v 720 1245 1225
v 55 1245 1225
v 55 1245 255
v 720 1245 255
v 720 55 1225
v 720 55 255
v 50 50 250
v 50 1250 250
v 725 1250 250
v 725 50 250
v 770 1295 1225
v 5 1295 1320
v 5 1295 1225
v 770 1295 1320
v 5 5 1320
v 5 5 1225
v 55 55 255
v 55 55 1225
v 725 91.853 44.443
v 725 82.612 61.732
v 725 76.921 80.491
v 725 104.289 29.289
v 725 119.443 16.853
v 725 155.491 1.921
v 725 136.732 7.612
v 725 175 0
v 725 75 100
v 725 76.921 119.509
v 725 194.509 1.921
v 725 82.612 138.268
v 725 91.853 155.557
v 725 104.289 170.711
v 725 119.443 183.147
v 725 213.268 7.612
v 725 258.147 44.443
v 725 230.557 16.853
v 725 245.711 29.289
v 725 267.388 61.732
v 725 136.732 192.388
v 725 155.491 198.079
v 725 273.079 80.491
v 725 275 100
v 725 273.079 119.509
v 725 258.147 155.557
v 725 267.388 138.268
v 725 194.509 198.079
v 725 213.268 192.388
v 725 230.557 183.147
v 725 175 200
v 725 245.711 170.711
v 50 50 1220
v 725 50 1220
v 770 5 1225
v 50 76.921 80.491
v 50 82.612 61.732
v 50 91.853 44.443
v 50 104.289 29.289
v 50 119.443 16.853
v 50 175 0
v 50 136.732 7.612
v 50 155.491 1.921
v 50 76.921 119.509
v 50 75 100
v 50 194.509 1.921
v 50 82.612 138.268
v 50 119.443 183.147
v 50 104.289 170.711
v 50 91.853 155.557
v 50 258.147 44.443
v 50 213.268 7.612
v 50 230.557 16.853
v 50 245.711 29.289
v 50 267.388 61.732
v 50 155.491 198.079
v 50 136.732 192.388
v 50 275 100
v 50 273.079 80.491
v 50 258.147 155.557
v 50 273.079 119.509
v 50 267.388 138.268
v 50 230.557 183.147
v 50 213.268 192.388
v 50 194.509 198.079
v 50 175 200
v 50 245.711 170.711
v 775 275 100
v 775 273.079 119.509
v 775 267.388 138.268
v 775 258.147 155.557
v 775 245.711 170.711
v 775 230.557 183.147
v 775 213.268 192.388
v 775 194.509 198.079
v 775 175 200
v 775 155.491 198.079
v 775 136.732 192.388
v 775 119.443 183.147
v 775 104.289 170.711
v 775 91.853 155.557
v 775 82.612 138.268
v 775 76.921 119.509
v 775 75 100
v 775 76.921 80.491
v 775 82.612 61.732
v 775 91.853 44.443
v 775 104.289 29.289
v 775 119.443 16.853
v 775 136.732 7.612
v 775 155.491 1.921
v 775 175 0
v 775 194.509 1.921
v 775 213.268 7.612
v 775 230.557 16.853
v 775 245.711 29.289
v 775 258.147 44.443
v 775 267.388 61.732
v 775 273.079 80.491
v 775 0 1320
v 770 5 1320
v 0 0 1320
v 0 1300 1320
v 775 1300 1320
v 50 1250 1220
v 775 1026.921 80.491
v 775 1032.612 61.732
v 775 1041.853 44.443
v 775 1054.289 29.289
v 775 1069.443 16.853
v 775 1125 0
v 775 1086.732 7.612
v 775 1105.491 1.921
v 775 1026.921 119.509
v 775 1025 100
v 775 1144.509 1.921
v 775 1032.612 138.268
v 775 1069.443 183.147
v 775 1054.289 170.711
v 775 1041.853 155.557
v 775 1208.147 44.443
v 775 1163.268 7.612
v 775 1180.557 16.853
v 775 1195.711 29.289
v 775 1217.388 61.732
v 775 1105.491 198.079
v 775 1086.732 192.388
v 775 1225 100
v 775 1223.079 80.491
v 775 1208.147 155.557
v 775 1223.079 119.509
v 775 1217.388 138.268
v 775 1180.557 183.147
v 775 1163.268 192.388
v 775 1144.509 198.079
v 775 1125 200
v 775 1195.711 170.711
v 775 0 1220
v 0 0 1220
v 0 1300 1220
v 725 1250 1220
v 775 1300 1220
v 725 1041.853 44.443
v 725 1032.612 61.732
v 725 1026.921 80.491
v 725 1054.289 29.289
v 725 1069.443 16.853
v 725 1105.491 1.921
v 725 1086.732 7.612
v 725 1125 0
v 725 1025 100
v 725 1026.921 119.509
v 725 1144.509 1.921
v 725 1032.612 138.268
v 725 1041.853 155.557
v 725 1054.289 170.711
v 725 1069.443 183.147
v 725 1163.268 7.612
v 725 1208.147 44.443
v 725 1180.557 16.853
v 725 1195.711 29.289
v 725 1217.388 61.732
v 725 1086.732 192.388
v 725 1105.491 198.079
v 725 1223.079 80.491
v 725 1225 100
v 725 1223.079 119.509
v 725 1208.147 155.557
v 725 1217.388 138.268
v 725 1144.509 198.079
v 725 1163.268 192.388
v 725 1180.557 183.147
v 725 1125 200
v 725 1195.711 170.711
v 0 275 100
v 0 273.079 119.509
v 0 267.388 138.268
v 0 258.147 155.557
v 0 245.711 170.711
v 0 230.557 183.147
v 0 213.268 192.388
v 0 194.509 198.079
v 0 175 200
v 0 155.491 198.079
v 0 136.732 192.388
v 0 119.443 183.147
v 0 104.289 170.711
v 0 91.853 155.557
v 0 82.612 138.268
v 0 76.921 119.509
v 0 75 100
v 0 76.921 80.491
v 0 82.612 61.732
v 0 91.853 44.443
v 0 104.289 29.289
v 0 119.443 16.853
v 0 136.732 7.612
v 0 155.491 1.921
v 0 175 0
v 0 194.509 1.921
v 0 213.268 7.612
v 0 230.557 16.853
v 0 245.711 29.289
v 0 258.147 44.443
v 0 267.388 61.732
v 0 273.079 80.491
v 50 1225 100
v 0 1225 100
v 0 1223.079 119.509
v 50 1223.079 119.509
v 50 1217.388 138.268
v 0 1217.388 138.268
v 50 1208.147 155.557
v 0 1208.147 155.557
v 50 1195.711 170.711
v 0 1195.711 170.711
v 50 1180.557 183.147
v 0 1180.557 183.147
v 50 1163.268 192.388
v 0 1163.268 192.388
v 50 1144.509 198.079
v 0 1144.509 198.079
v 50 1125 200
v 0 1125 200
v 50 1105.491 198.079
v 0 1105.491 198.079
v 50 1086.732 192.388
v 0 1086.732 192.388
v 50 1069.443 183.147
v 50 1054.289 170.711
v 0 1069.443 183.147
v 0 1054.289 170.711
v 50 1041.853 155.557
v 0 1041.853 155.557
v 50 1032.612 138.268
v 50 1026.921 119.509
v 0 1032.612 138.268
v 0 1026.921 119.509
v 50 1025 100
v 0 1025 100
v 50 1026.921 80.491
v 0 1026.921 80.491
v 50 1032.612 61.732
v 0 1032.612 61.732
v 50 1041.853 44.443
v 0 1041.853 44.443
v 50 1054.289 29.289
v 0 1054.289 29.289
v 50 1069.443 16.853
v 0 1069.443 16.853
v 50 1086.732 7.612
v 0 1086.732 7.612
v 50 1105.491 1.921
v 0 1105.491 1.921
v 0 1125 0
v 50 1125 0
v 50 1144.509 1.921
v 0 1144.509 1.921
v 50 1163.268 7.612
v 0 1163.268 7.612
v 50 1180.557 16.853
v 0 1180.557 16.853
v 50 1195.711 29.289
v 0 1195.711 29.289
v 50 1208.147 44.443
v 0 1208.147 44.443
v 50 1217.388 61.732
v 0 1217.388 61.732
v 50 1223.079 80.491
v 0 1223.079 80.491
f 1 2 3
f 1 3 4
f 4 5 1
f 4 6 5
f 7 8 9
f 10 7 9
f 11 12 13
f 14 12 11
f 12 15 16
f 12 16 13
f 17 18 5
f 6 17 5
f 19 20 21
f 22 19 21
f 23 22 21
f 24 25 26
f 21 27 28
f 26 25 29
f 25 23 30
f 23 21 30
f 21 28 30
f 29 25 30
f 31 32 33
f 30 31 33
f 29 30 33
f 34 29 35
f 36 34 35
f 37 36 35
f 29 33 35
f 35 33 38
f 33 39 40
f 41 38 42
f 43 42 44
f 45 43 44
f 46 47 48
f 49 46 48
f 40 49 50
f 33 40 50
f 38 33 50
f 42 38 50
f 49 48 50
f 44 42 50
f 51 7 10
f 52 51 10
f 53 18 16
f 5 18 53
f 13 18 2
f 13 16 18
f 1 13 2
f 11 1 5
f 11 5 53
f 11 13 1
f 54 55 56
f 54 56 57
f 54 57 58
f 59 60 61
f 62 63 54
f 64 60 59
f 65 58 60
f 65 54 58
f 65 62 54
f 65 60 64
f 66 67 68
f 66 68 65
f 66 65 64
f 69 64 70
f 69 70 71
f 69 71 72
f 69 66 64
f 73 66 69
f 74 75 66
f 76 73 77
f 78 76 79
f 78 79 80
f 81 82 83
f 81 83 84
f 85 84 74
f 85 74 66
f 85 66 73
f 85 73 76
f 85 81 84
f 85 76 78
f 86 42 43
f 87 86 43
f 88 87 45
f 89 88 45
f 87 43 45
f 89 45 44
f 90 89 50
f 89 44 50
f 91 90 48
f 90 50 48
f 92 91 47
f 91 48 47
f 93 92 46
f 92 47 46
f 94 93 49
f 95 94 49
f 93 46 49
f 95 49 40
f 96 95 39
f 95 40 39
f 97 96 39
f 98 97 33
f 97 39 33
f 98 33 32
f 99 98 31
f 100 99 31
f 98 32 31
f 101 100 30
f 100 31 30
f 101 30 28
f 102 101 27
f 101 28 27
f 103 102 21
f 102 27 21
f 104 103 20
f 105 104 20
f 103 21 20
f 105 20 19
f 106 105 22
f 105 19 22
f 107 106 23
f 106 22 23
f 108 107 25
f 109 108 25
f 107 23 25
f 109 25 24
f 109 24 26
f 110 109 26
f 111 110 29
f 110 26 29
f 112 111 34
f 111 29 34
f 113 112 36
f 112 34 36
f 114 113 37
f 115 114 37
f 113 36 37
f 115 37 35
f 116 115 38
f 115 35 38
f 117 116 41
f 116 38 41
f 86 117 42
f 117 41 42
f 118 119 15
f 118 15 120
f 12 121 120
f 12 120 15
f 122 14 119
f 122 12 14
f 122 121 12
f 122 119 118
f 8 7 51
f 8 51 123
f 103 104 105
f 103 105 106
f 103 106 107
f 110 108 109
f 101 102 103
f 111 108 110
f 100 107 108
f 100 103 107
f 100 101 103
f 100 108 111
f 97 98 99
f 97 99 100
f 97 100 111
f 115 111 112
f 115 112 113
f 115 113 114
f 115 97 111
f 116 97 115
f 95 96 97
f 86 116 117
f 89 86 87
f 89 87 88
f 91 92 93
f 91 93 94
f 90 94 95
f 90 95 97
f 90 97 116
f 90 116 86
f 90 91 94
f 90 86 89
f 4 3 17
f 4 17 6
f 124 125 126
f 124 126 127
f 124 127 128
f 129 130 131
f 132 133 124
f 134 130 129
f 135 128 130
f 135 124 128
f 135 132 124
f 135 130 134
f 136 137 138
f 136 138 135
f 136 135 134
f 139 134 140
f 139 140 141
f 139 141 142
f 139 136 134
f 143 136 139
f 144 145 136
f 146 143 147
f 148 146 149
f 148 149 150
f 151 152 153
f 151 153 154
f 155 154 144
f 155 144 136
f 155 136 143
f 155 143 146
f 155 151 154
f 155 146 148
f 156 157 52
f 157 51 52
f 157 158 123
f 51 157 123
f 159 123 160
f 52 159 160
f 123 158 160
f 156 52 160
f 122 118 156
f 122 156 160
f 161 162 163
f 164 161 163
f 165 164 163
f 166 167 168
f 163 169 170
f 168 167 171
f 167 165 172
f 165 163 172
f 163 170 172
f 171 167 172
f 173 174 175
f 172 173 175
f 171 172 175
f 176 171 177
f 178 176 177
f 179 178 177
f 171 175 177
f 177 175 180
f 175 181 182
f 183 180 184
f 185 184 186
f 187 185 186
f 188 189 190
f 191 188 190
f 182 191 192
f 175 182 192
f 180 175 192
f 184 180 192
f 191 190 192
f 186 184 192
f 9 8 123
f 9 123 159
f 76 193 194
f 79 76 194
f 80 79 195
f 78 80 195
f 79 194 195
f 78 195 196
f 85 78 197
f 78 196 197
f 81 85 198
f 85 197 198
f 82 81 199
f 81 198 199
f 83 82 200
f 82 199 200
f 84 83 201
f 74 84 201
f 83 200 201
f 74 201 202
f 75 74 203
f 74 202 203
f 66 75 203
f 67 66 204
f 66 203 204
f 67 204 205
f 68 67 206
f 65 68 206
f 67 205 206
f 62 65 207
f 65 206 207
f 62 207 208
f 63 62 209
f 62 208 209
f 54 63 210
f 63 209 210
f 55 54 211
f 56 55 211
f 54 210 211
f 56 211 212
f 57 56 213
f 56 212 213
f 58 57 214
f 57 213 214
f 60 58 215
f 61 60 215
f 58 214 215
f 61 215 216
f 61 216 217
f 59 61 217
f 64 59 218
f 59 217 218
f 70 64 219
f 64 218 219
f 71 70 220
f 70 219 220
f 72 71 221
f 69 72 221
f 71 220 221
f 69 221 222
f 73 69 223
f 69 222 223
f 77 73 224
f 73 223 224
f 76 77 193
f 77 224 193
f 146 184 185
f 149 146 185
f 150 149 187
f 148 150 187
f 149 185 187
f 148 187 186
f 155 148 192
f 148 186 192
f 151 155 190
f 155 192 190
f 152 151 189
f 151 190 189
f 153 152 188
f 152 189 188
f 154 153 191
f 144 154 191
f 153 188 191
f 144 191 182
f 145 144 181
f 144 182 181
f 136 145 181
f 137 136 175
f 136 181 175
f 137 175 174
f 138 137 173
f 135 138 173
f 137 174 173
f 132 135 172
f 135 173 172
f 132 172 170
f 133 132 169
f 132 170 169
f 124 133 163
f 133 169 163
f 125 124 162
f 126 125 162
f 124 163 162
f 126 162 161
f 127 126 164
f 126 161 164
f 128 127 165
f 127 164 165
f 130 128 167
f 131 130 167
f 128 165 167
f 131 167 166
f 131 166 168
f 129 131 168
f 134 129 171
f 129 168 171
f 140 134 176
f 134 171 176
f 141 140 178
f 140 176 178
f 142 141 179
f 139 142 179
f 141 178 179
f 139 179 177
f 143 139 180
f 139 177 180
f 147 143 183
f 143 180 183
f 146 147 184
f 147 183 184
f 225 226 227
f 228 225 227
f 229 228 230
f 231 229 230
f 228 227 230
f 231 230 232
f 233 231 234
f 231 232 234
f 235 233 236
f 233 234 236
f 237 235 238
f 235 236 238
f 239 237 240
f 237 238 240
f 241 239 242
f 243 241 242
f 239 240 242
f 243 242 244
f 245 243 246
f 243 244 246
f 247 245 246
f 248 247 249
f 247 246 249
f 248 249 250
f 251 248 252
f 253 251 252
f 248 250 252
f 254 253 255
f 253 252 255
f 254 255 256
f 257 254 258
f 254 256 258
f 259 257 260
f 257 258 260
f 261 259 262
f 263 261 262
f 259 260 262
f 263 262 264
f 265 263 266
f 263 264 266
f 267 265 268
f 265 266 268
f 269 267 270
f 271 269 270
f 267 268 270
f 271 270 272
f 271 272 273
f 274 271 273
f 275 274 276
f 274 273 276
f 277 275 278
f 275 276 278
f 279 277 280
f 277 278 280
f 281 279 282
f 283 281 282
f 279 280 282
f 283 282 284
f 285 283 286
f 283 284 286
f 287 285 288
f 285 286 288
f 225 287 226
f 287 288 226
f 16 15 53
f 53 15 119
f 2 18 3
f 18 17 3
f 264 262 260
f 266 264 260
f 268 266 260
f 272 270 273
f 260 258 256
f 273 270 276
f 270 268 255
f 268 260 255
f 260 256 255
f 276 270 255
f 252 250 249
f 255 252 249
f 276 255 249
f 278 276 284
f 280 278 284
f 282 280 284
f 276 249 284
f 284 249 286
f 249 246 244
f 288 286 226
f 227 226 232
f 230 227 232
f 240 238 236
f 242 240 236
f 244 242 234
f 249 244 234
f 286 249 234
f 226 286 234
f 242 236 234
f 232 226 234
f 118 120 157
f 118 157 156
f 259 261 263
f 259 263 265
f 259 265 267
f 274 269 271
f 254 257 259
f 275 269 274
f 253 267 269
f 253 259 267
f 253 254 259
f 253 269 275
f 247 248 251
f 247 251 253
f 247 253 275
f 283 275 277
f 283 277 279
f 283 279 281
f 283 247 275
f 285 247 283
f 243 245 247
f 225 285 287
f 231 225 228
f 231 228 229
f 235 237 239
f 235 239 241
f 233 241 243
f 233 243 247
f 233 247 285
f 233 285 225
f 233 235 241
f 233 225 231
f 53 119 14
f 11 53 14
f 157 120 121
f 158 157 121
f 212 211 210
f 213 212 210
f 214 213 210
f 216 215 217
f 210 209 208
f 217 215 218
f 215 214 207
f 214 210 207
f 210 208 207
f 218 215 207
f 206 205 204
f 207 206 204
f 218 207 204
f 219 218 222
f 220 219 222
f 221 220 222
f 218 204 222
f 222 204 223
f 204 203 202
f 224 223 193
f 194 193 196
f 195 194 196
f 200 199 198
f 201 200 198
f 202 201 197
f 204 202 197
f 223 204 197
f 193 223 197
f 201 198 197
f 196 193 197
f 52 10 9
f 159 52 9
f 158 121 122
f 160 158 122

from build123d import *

# Parameters (mm, degrees)
F1_W     = 675
F1_H     = 1200
F2_DEPTH = 1070
F3_W     = 775
F3_H     = 1300
F3_W_2   = 675
F3_H_2   = 1200
F4_DEPTH = 100
F5_T     = -5
F6_R     = 100
F7_DEPTH = 50
F8_R     = 100
F9_DEPTH = 50


# Not quite as in the source:
# - a feature names something its author has since deleted; it is built from what else it names


with BuildPart() as f2:
    # F1 (on offset) → F2 (new body)
    with BuildSketch(Plane.XY.offset(250)):
        with Locations((387.5, 650)):
            Rectangle(F1_W, F1_H)
    extrude(amount=F2_DEPTH)

    # F3 (on face) → F4 (join)
    with BuildSketch(Plane.XY.offset(1320)):
        with Locations((387.5, 650)):
            Rectangle(F3_W, F3_H)
        with Locations((387.5, 650)):
            Rectangle(F3_W_2, F3_H_2, mode=Mode.SUBTRACT)
    extrude(amount=-F4_DEPTH)

    # F5
    f5_openings = [f2.faces().sort_by_distance(p)[0] for p in [
        (387.5, 650, 1320),
    ]]
    offset(amount=F5_T, openings=f5_openings, kind=Kind.INTERSECTION)


with BuildPart() as f7:
    # F6 (on Right) → F7 (new body, through all)
    with BuildSketch(Plane.YZ):
        with Locations((1125, 100)):
            Circle(F6_R)
    extrude(amount=F7_DEPTH)


with BuildPart() as f7b:
    # F6 (on Right) → F7, piece 2 (new body, through all)
    with BuildSketch(Plane.YZ):
        with Locations((175, 100)):
            Circle(F6_R)
    extrude(amount=F7_DEPTH)


with BuildPart() as f9:
    # F8 (on face) → F9 (new body, through all)
    with BuildSketch(Plane.YZ.offset(725)):
        with Locations((1125, 100)):
            Circle(F8_R)
    extrude(amount=F9_DEPTH)


with BuildPart() as f9b:
    # F8 (on face) → F9, piece 2 (new body, through all)
    with BuildSketch(Plane.YZ.offset(725)):
        with Locations((175, 100)):
            Circle(F8_R)
    extrude(amount=F9_DEPTH)


solid = Compound([f2.part, f7.part, f7b.part, f9.part, f9b.part])
